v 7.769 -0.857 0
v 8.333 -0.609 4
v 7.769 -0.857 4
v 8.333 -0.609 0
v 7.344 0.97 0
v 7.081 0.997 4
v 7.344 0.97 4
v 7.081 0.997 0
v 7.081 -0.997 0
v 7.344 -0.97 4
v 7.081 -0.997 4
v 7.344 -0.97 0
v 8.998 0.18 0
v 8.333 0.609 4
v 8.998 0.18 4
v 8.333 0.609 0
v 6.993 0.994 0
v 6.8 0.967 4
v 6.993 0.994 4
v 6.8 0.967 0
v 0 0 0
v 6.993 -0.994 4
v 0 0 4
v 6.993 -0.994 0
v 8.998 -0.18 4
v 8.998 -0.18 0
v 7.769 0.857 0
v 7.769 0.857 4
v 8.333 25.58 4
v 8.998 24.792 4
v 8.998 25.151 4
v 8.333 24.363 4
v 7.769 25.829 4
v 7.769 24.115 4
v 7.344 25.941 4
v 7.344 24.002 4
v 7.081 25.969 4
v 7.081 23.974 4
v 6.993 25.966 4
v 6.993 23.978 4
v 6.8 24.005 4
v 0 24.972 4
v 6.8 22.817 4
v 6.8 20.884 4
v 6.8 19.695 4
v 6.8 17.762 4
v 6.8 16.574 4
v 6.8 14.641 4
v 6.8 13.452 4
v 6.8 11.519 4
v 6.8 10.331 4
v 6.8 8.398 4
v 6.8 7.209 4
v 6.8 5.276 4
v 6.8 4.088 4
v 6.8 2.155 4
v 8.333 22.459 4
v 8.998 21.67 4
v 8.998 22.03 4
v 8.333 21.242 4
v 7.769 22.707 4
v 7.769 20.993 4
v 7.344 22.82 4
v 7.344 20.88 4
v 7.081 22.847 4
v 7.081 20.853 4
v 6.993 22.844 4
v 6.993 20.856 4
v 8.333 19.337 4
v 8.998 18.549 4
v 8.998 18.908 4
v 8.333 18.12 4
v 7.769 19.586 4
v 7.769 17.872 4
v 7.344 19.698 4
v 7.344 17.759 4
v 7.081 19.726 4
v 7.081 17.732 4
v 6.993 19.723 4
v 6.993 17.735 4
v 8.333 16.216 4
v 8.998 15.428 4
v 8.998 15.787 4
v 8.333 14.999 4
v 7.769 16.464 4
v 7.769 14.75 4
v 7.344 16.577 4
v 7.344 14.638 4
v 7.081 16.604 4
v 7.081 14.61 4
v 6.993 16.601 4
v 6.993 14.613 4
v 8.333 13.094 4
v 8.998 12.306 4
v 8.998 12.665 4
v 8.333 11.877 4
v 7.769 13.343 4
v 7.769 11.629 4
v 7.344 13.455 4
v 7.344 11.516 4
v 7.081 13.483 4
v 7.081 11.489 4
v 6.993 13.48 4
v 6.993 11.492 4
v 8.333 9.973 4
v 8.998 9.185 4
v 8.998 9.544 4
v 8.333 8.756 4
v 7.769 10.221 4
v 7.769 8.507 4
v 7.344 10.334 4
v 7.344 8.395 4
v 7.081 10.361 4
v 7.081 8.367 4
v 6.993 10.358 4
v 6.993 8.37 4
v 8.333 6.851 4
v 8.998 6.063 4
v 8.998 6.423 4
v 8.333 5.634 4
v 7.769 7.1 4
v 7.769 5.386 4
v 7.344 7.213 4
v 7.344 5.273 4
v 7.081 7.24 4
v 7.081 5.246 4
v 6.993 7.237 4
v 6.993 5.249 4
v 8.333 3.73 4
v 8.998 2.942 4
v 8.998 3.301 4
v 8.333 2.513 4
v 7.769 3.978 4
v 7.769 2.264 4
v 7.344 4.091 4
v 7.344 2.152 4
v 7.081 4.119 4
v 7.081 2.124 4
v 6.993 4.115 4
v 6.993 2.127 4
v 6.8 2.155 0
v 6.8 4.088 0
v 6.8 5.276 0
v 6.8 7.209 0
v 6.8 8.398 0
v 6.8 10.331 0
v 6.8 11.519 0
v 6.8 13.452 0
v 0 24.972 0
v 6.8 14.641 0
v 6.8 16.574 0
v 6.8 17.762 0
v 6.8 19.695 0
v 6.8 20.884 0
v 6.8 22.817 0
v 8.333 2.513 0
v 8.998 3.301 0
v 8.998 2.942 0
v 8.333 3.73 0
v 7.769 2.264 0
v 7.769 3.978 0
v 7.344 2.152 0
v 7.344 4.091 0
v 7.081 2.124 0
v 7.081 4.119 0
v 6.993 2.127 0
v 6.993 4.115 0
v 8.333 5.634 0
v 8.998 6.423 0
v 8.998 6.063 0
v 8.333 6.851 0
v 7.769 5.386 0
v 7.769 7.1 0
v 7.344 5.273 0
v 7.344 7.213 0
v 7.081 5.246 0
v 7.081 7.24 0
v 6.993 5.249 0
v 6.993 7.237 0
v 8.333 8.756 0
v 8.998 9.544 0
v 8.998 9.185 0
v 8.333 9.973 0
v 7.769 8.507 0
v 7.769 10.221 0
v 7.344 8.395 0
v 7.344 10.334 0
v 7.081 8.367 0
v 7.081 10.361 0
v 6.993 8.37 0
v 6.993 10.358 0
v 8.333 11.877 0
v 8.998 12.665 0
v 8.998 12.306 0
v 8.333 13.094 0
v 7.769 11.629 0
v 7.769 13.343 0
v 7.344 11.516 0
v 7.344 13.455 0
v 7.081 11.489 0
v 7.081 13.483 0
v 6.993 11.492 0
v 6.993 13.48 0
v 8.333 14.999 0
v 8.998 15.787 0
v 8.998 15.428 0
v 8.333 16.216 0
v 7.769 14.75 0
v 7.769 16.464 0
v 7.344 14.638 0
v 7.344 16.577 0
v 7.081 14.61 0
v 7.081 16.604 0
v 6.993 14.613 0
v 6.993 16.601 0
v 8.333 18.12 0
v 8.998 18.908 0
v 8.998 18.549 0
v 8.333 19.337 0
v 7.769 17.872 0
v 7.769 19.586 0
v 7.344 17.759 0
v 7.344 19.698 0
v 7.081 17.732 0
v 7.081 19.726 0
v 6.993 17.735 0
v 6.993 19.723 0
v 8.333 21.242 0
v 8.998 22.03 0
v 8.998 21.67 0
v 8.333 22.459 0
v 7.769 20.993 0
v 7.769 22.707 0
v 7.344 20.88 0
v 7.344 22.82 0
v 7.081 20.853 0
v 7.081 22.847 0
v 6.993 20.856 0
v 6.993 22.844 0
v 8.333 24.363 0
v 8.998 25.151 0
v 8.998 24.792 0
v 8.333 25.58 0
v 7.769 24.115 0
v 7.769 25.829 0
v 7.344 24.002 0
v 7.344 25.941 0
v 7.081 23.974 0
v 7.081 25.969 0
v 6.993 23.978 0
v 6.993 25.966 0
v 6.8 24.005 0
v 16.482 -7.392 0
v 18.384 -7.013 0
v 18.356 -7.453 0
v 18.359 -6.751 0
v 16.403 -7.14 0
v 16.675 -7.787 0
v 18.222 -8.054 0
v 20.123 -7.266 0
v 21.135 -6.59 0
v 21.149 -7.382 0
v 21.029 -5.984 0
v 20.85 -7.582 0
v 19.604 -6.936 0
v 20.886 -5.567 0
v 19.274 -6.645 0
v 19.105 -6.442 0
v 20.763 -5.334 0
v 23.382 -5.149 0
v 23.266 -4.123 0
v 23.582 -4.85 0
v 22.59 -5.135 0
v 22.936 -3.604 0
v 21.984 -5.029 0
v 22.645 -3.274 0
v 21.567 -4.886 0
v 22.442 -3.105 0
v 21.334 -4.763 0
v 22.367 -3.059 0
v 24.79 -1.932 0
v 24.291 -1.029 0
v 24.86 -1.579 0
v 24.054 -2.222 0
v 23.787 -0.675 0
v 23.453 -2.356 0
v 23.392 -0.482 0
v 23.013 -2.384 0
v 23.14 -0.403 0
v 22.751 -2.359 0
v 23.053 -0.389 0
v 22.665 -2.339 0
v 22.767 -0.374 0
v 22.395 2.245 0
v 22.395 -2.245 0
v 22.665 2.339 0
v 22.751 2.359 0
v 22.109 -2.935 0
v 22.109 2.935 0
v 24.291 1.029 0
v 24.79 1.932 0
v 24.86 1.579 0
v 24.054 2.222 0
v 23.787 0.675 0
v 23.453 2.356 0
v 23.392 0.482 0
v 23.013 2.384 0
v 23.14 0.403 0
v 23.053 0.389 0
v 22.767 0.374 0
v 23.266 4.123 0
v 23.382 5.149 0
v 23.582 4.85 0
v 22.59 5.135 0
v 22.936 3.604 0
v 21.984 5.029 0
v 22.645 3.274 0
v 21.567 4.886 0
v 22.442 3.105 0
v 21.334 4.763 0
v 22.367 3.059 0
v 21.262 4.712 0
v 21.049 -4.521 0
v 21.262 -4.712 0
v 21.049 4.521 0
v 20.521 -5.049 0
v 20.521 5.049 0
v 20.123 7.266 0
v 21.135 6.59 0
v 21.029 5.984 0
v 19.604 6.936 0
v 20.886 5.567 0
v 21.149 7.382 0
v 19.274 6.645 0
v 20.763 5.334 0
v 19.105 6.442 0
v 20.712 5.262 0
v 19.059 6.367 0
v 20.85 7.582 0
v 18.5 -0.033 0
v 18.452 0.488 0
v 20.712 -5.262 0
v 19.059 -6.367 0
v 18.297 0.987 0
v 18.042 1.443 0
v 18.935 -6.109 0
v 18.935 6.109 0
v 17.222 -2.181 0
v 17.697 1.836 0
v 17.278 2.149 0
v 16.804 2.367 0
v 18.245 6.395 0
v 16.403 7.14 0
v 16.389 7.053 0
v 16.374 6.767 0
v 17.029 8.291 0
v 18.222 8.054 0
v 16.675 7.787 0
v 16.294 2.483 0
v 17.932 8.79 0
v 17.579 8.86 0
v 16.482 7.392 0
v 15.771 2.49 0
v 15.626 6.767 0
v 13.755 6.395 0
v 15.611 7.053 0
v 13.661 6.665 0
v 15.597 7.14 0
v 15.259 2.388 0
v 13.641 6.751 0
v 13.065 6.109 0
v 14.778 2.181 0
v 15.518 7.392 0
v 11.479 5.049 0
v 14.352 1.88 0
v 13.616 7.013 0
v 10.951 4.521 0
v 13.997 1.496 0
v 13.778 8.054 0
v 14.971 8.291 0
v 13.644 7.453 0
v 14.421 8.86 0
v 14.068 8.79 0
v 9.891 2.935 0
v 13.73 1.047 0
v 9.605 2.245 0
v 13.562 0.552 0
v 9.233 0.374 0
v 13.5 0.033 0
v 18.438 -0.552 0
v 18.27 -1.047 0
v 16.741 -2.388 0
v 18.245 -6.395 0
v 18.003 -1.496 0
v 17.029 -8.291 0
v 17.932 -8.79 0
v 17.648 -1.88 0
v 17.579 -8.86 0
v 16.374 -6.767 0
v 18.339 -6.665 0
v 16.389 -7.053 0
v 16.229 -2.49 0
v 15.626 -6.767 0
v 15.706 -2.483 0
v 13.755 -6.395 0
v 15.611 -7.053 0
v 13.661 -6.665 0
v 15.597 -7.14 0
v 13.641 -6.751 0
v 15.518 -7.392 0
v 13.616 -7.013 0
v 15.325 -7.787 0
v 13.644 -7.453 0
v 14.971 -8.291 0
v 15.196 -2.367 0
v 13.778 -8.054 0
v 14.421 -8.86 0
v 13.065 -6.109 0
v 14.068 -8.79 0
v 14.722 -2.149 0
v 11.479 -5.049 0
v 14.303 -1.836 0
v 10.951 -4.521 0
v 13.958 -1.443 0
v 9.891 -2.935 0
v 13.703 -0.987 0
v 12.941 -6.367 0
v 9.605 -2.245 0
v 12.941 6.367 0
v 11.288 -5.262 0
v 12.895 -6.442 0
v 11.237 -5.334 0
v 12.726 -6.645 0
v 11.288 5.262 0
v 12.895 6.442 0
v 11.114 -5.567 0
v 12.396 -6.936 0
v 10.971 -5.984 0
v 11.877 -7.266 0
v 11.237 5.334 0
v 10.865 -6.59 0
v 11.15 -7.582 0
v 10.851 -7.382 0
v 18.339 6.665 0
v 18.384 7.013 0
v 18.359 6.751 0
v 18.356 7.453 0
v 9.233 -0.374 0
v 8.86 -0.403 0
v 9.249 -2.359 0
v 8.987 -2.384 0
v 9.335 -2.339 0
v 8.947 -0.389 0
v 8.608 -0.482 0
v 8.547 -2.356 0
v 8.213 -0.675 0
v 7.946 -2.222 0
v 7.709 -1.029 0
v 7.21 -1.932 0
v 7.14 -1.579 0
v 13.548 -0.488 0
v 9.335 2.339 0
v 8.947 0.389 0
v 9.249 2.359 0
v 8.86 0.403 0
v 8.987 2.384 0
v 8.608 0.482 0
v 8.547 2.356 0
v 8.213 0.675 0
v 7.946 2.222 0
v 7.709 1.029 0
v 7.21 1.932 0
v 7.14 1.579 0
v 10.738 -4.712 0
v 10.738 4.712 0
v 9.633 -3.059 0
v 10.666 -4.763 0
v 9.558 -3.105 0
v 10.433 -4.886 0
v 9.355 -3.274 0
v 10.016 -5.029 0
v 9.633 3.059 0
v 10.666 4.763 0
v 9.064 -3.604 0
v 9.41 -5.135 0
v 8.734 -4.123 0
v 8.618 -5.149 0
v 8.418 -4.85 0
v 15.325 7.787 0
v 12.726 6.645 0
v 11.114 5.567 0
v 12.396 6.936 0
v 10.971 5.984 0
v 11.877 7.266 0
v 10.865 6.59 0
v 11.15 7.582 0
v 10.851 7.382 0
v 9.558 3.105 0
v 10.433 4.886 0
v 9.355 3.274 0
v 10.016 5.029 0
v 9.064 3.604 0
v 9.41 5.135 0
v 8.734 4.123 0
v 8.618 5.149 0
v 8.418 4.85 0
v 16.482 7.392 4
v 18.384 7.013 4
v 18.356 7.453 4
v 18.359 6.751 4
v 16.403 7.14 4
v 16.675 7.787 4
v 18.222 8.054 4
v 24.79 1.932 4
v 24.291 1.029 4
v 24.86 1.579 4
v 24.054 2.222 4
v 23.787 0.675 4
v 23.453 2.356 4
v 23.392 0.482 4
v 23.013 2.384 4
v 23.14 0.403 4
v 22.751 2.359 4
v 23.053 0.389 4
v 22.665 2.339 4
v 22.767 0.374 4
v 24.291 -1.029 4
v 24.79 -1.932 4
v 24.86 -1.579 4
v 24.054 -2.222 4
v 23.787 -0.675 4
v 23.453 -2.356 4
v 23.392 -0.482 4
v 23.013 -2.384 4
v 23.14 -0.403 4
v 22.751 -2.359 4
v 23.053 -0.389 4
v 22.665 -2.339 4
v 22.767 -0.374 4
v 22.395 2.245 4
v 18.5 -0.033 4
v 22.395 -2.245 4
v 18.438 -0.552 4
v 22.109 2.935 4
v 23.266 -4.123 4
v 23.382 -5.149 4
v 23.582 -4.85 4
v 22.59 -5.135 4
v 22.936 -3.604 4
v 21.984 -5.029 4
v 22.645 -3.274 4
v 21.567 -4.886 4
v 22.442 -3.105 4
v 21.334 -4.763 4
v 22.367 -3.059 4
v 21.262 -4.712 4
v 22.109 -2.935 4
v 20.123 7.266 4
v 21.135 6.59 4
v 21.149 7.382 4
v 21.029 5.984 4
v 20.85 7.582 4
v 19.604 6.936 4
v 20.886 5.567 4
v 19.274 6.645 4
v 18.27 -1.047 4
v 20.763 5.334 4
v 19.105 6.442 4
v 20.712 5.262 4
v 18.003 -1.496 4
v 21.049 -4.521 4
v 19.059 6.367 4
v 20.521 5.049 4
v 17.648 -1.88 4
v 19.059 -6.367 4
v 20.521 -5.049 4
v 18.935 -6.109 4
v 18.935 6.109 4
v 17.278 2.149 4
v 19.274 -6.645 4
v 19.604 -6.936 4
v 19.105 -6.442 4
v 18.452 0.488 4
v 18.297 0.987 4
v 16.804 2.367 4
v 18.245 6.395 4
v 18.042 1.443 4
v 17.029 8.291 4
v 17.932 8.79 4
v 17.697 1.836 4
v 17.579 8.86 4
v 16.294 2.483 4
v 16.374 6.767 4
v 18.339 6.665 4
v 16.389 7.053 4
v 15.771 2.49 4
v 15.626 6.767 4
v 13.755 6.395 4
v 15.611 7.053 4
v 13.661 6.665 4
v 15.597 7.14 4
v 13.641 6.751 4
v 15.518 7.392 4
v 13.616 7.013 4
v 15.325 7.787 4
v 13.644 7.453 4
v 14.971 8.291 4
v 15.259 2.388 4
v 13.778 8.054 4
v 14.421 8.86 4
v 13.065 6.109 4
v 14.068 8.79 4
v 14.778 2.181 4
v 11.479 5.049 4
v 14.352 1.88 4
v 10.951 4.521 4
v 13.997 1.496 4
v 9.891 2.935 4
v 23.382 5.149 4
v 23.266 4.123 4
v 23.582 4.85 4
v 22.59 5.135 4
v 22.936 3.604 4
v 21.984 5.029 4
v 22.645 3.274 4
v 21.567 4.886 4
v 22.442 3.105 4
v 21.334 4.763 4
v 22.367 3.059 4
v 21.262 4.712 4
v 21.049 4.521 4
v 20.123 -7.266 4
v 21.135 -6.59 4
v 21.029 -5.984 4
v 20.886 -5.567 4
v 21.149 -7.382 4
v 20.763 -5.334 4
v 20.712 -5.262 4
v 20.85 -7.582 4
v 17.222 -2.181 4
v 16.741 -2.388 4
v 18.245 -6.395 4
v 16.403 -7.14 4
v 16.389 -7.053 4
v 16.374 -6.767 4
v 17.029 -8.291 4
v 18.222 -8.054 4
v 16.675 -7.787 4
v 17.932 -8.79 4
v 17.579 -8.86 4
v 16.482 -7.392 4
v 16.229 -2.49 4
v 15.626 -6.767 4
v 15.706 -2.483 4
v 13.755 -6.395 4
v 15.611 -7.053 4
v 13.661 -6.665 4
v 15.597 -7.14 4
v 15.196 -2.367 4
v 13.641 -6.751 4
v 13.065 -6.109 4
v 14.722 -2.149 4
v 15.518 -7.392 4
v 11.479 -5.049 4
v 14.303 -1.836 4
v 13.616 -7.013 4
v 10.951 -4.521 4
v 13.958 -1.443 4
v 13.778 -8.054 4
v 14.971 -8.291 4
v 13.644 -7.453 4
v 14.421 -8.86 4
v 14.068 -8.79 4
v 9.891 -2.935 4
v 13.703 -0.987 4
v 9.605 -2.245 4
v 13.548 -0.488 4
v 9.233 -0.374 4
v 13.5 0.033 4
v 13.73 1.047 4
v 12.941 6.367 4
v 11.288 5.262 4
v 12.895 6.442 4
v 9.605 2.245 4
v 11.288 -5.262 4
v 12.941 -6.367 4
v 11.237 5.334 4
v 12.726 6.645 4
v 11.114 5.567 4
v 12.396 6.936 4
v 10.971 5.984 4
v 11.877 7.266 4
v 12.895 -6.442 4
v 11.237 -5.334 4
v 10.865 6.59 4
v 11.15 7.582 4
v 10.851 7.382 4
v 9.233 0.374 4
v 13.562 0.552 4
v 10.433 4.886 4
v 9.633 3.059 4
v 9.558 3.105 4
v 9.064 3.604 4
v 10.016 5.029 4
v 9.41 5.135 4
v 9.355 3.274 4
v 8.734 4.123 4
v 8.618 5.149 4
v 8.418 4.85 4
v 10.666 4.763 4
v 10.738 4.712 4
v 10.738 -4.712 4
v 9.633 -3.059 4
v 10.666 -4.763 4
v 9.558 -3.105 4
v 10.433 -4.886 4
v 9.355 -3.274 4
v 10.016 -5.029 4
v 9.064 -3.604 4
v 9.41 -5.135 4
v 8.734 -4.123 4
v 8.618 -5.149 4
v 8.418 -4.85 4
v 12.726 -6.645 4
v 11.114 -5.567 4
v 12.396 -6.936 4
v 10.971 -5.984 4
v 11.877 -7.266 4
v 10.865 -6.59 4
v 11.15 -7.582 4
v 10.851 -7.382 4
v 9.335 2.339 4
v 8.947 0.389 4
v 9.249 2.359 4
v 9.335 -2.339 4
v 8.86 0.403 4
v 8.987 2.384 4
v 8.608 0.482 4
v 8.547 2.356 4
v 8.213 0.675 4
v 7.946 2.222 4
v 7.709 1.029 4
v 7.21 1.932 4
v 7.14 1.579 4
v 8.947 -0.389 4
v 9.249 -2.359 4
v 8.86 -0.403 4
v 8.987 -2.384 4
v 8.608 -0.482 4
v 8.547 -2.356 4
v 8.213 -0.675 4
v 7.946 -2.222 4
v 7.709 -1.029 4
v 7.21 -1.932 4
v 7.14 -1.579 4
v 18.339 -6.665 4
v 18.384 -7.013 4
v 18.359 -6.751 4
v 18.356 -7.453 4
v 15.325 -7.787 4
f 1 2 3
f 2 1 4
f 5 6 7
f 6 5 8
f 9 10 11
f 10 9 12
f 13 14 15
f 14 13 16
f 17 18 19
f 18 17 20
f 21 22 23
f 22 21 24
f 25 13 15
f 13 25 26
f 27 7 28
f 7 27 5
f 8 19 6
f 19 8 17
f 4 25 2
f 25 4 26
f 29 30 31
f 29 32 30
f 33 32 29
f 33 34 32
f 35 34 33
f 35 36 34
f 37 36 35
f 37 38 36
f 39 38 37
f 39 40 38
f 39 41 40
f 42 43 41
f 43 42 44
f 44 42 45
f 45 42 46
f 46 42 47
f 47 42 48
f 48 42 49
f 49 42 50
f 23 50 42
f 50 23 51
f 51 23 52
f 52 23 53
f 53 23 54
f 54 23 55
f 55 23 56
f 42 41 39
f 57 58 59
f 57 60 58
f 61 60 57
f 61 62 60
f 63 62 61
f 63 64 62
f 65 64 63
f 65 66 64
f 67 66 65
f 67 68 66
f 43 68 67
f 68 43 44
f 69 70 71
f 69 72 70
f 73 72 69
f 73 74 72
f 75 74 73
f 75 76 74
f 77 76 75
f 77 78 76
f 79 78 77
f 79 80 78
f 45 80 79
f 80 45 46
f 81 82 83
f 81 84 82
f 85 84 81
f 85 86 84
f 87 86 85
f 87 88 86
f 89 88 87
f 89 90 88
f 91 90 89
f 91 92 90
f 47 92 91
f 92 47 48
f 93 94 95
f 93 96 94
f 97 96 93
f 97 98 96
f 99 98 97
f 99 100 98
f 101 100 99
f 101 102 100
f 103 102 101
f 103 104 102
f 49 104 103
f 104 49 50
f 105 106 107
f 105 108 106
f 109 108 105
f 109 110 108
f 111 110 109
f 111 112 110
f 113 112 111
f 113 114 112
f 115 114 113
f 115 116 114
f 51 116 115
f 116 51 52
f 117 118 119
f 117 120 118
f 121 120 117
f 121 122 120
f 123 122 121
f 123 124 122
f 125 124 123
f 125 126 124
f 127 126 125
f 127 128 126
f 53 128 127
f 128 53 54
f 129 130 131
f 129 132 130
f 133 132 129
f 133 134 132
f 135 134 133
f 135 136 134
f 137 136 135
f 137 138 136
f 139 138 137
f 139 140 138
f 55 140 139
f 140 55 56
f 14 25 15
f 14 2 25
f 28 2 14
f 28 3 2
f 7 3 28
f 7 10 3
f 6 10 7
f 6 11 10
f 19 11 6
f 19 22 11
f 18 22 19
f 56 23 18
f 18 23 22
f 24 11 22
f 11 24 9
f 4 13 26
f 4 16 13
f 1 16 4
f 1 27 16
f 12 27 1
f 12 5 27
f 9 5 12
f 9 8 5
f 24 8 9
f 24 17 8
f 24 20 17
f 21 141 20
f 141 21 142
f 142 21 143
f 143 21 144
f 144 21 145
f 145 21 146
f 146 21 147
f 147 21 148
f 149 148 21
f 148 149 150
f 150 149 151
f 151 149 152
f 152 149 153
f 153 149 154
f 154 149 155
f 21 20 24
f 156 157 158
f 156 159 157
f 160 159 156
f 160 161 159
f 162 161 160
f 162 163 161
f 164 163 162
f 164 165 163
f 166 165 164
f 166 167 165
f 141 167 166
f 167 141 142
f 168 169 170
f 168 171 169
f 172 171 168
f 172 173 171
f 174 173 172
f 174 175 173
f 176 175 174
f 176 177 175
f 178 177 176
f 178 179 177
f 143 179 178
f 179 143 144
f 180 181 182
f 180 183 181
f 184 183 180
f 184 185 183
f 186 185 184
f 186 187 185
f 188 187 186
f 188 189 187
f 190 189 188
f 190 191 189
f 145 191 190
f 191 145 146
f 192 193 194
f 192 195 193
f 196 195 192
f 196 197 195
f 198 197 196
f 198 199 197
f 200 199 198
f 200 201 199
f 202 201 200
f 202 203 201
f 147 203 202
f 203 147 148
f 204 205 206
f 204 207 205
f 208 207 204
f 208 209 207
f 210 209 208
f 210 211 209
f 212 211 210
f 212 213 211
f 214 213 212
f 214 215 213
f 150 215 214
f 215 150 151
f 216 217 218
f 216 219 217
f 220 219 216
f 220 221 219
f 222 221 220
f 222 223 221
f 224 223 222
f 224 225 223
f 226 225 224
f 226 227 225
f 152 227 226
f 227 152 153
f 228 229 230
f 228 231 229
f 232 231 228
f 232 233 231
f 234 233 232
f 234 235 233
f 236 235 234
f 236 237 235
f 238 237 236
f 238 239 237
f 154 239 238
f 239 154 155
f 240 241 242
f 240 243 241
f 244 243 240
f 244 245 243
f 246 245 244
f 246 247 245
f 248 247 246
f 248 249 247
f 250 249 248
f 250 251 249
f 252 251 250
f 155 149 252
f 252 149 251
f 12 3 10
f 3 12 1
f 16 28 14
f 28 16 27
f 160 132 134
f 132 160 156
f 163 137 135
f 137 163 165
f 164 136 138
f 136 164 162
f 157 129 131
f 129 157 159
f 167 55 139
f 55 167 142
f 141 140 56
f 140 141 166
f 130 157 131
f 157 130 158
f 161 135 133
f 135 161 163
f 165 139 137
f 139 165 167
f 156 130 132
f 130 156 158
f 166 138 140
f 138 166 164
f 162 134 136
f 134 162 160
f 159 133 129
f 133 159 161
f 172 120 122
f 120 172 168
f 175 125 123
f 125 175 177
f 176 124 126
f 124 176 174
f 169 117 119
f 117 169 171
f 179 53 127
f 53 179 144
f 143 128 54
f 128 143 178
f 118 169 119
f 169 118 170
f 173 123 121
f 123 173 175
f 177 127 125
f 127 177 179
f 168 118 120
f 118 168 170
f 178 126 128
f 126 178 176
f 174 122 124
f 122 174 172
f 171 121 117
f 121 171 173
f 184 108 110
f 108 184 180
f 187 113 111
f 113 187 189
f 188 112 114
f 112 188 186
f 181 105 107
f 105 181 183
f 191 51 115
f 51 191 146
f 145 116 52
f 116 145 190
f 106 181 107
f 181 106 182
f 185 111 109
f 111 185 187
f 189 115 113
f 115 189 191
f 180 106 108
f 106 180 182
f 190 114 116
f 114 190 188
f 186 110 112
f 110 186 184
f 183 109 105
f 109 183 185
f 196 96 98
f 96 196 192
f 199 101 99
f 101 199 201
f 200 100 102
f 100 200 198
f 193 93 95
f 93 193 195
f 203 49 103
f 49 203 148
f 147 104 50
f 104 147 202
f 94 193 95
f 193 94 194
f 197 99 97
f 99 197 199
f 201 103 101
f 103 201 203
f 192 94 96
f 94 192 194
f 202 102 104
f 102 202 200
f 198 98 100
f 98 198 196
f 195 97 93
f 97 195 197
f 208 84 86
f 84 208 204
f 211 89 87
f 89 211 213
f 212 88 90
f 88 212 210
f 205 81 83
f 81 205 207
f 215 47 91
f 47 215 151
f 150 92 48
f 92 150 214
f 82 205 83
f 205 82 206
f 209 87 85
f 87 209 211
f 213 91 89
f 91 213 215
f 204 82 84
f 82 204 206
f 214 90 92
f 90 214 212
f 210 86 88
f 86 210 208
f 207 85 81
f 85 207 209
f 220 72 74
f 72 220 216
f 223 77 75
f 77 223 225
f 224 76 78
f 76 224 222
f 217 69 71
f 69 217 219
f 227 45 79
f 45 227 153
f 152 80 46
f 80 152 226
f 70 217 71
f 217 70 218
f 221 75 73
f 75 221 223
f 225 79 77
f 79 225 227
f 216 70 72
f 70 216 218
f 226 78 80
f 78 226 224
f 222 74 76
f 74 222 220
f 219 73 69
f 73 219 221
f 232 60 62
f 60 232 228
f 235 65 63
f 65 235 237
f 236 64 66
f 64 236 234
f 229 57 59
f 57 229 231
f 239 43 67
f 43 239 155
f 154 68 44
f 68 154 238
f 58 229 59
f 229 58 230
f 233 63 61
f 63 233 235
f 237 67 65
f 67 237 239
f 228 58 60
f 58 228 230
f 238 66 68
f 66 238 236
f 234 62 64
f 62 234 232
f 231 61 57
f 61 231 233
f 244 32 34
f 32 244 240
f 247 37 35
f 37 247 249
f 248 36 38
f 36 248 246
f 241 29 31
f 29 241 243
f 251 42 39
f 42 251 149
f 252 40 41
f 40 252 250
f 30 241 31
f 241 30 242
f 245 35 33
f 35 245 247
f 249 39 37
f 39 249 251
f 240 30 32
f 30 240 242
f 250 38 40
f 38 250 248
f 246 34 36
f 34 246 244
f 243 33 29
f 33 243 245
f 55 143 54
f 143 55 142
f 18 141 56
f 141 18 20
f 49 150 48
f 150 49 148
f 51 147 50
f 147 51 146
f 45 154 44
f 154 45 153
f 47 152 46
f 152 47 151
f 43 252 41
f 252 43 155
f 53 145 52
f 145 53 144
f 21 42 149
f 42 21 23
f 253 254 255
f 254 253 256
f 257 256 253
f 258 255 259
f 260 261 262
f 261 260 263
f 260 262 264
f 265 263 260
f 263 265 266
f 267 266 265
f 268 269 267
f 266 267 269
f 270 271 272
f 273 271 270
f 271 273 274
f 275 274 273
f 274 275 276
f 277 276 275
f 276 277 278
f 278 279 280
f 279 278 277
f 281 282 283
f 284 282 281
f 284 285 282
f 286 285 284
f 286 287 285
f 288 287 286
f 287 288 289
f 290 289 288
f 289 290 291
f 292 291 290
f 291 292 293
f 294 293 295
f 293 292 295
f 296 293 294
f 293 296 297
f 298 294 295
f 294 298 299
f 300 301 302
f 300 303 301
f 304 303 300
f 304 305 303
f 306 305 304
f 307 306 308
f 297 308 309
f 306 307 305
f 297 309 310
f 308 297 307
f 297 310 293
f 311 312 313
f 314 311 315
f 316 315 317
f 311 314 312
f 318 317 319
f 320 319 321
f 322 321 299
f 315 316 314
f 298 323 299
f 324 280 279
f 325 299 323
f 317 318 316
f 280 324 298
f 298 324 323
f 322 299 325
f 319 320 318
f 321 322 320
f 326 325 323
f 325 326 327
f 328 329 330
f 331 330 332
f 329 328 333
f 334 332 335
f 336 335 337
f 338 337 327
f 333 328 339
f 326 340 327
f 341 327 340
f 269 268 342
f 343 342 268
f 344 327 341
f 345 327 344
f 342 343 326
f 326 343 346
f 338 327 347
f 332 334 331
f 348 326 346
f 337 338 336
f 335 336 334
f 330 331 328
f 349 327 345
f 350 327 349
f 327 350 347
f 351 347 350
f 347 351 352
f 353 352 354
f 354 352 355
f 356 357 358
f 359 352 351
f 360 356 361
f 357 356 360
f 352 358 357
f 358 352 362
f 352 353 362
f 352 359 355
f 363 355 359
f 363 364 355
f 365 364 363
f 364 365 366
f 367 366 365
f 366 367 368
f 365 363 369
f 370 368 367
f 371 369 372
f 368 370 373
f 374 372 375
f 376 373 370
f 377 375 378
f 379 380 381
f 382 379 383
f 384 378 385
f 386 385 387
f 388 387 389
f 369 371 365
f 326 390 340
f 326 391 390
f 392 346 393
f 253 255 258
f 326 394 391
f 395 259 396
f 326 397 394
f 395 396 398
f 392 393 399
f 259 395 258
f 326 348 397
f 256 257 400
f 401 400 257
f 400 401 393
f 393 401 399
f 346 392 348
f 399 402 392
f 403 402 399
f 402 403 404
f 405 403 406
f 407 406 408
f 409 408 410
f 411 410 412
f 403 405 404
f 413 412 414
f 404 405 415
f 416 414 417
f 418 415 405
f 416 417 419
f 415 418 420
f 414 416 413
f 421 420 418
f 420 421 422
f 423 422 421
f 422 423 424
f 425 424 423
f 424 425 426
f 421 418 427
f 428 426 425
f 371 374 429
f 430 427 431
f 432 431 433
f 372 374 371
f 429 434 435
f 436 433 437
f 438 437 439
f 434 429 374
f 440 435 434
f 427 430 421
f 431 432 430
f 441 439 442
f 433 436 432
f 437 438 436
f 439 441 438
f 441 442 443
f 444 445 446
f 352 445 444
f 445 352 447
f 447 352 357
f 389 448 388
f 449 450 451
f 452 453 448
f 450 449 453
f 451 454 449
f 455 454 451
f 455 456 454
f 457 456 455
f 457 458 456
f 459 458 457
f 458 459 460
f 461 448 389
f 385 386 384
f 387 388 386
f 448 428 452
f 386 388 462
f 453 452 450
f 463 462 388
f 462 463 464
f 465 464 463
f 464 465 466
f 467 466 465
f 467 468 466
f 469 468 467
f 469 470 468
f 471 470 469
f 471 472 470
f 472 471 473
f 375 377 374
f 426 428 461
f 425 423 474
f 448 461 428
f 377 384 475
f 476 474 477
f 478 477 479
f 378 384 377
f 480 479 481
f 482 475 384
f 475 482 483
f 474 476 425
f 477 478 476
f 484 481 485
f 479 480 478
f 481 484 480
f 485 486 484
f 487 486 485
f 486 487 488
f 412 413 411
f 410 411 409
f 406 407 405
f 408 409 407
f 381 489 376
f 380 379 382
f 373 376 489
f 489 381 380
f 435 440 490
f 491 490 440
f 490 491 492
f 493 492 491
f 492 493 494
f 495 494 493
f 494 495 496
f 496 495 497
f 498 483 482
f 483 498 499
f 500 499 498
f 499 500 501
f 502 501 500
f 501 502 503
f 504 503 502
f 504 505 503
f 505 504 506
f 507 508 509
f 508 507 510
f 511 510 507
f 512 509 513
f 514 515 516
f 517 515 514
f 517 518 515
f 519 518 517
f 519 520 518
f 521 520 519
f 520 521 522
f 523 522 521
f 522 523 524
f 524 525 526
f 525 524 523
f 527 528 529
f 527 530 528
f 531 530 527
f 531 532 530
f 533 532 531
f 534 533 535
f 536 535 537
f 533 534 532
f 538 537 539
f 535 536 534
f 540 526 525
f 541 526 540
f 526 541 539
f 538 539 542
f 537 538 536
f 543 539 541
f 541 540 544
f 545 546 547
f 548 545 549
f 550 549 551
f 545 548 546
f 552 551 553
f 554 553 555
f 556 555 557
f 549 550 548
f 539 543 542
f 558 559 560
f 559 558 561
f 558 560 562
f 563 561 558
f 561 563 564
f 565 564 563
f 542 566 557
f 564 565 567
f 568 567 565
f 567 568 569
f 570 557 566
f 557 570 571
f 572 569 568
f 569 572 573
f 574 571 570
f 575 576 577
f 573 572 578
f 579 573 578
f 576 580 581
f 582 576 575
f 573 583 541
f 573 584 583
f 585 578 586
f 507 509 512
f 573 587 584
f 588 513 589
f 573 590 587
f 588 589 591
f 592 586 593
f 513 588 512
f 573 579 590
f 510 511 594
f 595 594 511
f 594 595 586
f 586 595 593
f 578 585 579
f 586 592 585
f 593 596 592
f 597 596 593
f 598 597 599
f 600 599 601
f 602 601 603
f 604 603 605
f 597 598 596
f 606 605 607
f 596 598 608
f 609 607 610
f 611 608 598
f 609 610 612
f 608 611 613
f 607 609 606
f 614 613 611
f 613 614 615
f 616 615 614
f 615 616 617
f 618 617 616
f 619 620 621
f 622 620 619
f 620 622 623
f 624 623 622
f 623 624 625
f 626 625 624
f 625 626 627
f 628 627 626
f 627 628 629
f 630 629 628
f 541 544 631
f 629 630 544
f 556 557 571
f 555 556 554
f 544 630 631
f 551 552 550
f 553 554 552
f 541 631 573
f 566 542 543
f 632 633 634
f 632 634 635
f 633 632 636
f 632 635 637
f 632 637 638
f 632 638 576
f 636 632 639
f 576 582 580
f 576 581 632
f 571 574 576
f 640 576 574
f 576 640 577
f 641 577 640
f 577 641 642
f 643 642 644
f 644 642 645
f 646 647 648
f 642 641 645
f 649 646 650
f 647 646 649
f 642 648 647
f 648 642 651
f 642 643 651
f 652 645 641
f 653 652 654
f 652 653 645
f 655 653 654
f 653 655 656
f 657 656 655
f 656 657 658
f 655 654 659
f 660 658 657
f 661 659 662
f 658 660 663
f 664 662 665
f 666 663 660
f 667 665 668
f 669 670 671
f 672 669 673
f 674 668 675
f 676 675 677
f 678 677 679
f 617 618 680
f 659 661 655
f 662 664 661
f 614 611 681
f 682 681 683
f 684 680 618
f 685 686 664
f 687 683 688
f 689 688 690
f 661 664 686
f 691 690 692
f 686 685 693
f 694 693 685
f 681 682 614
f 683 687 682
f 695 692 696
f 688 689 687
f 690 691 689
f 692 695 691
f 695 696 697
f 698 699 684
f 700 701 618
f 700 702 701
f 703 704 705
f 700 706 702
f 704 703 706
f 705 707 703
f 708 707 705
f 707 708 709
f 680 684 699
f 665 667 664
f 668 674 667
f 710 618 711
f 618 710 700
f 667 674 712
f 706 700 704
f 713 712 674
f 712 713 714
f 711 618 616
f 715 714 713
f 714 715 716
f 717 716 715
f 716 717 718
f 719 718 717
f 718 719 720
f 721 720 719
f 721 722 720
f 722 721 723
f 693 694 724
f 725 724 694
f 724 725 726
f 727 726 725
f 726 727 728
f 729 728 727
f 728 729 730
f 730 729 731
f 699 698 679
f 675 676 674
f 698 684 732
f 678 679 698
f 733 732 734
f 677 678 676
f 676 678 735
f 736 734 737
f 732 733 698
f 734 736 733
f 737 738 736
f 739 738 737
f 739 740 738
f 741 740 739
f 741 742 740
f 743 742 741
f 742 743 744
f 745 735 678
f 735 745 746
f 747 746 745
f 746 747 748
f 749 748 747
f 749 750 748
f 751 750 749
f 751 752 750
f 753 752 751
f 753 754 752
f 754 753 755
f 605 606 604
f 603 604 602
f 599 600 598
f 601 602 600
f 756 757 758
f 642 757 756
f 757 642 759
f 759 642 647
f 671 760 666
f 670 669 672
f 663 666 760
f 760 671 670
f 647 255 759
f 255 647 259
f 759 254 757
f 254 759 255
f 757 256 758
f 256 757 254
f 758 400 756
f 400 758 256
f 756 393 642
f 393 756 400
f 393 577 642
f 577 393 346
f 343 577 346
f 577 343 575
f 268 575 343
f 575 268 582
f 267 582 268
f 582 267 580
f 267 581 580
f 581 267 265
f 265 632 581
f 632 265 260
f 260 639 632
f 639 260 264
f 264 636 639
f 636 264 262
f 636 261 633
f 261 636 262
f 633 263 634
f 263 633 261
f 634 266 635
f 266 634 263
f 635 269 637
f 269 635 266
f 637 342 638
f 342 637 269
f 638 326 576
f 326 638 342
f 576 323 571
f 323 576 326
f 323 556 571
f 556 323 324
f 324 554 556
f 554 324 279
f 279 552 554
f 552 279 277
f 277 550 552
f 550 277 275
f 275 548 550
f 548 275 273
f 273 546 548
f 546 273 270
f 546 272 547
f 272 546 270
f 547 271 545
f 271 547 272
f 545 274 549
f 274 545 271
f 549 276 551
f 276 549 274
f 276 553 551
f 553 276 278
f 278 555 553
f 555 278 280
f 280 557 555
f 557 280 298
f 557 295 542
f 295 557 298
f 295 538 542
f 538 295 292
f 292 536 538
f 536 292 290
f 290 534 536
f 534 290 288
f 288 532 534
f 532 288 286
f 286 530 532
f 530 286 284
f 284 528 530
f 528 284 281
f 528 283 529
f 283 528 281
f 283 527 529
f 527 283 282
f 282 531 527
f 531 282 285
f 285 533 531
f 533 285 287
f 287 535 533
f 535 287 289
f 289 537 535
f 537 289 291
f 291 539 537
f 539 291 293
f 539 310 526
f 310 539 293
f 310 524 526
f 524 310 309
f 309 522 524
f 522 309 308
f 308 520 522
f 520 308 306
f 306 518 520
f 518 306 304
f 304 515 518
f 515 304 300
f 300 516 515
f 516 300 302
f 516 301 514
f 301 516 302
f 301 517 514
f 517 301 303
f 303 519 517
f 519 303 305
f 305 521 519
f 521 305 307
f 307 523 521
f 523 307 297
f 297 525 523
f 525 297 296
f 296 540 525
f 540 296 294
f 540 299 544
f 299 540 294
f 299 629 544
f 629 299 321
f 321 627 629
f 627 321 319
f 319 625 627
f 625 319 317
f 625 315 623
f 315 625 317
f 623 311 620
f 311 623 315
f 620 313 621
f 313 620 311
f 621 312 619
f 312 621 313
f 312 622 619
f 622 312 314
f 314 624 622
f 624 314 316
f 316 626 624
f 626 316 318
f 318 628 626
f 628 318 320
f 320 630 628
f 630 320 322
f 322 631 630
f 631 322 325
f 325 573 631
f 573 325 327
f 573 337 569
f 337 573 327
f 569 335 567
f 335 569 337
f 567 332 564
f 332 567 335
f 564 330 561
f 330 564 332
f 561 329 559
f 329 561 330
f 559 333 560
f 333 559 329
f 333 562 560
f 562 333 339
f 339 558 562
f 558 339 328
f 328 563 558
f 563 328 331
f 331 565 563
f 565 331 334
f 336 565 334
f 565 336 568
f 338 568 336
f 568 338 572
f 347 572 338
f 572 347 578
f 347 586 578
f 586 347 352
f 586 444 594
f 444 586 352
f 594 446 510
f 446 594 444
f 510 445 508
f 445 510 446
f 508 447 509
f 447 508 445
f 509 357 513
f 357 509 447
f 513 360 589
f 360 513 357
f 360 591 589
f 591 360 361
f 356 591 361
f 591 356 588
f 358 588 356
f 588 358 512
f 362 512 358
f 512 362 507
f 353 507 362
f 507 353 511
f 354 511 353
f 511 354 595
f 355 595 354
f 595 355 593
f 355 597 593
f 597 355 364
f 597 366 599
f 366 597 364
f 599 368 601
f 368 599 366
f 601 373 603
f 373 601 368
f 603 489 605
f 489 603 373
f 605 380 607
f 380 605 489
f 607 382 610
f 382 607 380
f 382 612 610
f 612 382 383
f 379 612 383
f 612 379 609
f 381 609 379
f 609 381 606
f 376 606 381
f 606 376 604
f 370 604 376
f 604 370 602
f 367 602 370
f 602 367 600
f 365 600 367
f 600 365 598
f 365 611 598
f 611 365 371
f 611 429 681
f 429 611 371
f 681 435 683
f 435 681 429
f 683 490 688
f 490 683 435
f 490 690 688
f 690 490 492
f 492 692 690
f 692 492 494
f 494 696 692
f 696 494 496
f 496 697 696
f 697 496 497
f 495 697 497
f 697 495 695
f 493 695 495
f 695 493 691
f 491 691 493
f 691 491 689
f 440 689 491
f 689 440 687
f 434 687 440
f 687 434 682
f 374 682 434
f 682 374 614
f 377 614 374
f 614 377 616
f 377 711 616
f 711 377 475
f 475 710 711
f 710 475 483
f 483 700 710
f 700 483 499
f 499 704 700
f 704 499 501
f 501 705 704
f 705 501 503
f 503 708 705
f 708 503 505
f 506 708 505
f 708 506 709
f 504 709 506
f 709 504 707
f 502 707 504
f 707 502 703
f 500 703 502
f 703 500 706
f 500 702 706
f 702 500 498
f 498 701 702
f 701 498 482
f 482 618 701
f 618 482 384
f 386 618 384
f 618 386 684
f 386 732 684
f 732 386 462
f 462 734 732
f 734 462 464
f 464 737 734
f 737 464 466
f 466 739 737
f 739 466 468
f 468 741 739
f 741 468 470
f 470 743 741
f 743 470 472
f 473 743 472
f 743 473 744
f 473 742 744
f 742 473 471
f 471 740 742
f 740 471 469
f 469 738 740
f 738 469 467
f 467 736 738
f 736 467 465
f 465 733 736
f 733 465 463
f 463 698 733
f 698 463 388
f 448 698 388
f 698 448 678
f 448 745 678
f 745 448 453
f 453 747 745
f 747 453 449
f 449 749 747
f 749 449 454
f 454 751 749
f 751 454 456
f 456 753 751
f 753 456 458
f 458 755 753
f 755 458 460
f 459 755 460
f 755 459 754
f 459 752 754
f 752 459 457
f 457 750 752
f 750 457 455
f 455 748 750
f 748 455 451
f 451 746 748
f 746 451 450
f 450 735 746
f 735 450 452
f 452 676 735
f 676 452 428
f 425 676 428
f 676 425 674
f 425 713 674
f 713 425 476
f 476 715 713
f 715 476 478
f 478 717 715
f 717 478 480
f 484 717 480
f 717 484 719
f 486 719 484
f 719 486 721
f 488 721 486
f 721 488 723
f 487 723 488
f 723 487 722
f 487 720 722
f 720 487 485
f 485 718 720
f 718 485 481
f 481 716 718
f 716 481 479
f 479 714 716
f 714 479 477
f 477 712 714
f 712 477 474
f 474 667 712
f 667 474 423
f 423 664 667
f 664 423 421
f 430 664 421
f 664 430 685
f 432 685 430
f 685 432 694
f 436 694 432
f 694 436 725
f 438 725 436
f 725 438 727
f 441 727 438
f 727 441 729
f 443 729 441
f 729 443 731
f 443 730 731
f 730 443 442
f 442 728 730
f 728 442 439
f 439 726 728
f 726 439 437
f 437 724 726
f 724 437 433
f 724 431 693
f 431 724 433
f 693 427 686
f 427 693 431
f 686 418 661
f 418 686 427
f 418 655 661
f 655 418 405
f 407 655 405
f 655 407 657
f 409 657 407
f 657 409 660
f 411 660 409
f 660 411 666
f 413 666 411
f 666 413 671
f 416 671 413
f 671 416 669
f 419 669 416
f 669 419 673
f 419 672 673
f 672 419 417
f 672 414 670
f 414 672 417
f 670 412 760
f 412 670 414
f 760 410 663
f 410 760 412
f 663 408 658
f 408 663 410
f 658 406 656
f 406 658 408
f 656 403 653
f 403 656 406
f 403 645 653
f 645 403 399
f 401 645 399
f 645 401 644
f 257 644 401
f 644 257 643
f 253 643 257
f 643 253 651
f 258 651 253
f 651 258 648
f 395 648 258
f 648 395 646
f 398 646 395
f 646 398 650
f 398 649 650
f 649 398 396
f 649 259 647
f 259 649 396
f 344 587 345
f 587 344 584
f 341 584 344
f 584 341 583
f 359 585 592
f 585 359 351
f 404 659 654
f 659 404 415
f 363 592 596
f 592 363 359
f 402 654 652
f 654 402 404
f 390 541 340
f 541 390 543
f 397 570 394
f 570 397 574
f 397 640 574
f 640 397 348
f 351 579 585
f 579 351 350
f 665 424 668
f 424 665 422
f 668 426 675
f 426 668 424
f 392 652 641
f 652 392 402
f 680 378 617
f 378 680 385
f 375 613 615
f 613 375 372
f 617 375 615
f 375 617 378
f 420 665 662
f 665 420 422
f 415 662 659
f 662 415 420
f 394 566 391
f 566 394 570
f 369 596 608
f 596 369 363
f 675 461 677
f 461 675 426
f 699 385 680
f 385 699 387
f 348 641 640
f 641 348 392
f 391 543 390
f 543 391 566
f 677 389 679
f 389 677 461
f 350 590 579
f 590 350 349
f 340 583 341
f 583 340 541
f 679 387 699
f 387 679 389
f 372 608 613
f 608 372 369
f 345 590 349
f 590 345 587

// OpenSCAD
use <MCAD/involute_gears.scad>

height = 4;

circular_pitch=180;
number_of_pinion_teeth=16; // [12:1:200]
pressure_angle = 28;

spacing_between_objects = 0; // [0:real, 5:apart]

function pitch_radius(number_of_teeth, circular_pitch) = (number_of_teeth * circular_pitch / 180) / 2;

function linear_tooth_size(number_of_teeth, circular_pitch) = 
    2*sin(360/number_of_teeth/2)*pitch_radius(number_of_teeth, circular_pitch);


module rack(circular_pitch, number_of_pinion_teeth, number_of_rack_teeth, height,
pressure_angle=28,
clearance=0.2) 

{
    pitch_diameter  =  number_of_pinion_teeth * circular_pitch / 180;
    pitch_radius = pitch_diameter/2;

    base_radius = pitch_radius*cos(pressure_angle);

    // Diametrial pitch: Number of teeth per unit length.
    pitch_diametrial = number_of_pinion_teeth / pitch_diameter;

    // Addendum: Radial distance from pitch circle to outside circle.
    addendum = 1/pitch_diametrial;

    //Outer Circle
    outer_radius = pitch_radius+addendum;

    // Dedendum: Radial distance from pitch circle to root diameter
    dedendum = addendum + clearance;

    root_radius = pitch_radius-dedendum;
    half_thick_angle = (360 / number_of_pinion_teeth) / 4;

    echo("pitch_radius", pitch_radius);
    echo("outer_radius", outer_radius);
    echo("pitch_diametrial", pitch_diametrial);
    echo("addendum", addendum);
    echo("dedendum", dedendum);

    O = 360/number_of_pinion_teeth;
    th=2*sin(O/2)*pitch_radius;
    rack_teeth=number_of_rack_teeth;
    echo("tooth_length", th);
    echo("rack_length", th*rack_teeth);

    union() {
        for (i=[0:rack_teeth]) {
            translate([0,i*th,0])
            linear_extrude(height)
            involute_gear_tooth(
                pitch_radius=pitch_radius,
                root_radius=root_radius,
                base_radius=base_radius,
                outer_radius=outer_radius,
                half_thick_angle=half_thick_angle,
                involute_facets=0);
        }
        cube([root_radius,th*rack_teeth, height]);
    }
}    


module pinion(circular_pitch, number_of_teeth, height, pressure_angle=28, clearance=0.2) {
    rotate([0,0,(number_of_teeth % 2 == 0) ? 180/number_of_teeth:0])
    gear(number_of_teeth=number_of_teeth,
            circular_pitch=circular_pitch,
            pressure_angle=pressure_angle,
            clearance = clearance,
            gear_thickness=height,
            rim_thickness=height,
            rim_width=5,
            hub_thickness=4,
            hub_diameter=4,
            bore_diameter=5,
            circles=0,
            backlash=0,
            twist=0,
            involute_facets=0,
            flat=false);
    
}

anim_phase = $t > 0.5 ? (1-$t) : $t;

th = linear_tooth_size(number_of_pinion_teeth, circular_pitch);

num_rack_teeth=ceil(number_of_pinion_teeth)/2;
translate([0,-th*number_of_pinion_teeth*anim_phase,0])
rack(circular_pitch, number_of_pinion_teeth, num_rack_teeth, height, pressure_angle);

translate([spacing_between_objects, 0, 0])
translate([pitch_radius(number_of_pinion_teeth, circular_pitch)*2,0,0])   
    rotate([0,0,anim_phase*360]) {
        color([0.3, 0.5, 0.8])
        pinion(circular_pitch, number_of_pinion_teeth, height, pressure_angle);
        
    }
$fs=0.5;


//ma=15;
//d=18;
//echo(cos(ma)*d);
